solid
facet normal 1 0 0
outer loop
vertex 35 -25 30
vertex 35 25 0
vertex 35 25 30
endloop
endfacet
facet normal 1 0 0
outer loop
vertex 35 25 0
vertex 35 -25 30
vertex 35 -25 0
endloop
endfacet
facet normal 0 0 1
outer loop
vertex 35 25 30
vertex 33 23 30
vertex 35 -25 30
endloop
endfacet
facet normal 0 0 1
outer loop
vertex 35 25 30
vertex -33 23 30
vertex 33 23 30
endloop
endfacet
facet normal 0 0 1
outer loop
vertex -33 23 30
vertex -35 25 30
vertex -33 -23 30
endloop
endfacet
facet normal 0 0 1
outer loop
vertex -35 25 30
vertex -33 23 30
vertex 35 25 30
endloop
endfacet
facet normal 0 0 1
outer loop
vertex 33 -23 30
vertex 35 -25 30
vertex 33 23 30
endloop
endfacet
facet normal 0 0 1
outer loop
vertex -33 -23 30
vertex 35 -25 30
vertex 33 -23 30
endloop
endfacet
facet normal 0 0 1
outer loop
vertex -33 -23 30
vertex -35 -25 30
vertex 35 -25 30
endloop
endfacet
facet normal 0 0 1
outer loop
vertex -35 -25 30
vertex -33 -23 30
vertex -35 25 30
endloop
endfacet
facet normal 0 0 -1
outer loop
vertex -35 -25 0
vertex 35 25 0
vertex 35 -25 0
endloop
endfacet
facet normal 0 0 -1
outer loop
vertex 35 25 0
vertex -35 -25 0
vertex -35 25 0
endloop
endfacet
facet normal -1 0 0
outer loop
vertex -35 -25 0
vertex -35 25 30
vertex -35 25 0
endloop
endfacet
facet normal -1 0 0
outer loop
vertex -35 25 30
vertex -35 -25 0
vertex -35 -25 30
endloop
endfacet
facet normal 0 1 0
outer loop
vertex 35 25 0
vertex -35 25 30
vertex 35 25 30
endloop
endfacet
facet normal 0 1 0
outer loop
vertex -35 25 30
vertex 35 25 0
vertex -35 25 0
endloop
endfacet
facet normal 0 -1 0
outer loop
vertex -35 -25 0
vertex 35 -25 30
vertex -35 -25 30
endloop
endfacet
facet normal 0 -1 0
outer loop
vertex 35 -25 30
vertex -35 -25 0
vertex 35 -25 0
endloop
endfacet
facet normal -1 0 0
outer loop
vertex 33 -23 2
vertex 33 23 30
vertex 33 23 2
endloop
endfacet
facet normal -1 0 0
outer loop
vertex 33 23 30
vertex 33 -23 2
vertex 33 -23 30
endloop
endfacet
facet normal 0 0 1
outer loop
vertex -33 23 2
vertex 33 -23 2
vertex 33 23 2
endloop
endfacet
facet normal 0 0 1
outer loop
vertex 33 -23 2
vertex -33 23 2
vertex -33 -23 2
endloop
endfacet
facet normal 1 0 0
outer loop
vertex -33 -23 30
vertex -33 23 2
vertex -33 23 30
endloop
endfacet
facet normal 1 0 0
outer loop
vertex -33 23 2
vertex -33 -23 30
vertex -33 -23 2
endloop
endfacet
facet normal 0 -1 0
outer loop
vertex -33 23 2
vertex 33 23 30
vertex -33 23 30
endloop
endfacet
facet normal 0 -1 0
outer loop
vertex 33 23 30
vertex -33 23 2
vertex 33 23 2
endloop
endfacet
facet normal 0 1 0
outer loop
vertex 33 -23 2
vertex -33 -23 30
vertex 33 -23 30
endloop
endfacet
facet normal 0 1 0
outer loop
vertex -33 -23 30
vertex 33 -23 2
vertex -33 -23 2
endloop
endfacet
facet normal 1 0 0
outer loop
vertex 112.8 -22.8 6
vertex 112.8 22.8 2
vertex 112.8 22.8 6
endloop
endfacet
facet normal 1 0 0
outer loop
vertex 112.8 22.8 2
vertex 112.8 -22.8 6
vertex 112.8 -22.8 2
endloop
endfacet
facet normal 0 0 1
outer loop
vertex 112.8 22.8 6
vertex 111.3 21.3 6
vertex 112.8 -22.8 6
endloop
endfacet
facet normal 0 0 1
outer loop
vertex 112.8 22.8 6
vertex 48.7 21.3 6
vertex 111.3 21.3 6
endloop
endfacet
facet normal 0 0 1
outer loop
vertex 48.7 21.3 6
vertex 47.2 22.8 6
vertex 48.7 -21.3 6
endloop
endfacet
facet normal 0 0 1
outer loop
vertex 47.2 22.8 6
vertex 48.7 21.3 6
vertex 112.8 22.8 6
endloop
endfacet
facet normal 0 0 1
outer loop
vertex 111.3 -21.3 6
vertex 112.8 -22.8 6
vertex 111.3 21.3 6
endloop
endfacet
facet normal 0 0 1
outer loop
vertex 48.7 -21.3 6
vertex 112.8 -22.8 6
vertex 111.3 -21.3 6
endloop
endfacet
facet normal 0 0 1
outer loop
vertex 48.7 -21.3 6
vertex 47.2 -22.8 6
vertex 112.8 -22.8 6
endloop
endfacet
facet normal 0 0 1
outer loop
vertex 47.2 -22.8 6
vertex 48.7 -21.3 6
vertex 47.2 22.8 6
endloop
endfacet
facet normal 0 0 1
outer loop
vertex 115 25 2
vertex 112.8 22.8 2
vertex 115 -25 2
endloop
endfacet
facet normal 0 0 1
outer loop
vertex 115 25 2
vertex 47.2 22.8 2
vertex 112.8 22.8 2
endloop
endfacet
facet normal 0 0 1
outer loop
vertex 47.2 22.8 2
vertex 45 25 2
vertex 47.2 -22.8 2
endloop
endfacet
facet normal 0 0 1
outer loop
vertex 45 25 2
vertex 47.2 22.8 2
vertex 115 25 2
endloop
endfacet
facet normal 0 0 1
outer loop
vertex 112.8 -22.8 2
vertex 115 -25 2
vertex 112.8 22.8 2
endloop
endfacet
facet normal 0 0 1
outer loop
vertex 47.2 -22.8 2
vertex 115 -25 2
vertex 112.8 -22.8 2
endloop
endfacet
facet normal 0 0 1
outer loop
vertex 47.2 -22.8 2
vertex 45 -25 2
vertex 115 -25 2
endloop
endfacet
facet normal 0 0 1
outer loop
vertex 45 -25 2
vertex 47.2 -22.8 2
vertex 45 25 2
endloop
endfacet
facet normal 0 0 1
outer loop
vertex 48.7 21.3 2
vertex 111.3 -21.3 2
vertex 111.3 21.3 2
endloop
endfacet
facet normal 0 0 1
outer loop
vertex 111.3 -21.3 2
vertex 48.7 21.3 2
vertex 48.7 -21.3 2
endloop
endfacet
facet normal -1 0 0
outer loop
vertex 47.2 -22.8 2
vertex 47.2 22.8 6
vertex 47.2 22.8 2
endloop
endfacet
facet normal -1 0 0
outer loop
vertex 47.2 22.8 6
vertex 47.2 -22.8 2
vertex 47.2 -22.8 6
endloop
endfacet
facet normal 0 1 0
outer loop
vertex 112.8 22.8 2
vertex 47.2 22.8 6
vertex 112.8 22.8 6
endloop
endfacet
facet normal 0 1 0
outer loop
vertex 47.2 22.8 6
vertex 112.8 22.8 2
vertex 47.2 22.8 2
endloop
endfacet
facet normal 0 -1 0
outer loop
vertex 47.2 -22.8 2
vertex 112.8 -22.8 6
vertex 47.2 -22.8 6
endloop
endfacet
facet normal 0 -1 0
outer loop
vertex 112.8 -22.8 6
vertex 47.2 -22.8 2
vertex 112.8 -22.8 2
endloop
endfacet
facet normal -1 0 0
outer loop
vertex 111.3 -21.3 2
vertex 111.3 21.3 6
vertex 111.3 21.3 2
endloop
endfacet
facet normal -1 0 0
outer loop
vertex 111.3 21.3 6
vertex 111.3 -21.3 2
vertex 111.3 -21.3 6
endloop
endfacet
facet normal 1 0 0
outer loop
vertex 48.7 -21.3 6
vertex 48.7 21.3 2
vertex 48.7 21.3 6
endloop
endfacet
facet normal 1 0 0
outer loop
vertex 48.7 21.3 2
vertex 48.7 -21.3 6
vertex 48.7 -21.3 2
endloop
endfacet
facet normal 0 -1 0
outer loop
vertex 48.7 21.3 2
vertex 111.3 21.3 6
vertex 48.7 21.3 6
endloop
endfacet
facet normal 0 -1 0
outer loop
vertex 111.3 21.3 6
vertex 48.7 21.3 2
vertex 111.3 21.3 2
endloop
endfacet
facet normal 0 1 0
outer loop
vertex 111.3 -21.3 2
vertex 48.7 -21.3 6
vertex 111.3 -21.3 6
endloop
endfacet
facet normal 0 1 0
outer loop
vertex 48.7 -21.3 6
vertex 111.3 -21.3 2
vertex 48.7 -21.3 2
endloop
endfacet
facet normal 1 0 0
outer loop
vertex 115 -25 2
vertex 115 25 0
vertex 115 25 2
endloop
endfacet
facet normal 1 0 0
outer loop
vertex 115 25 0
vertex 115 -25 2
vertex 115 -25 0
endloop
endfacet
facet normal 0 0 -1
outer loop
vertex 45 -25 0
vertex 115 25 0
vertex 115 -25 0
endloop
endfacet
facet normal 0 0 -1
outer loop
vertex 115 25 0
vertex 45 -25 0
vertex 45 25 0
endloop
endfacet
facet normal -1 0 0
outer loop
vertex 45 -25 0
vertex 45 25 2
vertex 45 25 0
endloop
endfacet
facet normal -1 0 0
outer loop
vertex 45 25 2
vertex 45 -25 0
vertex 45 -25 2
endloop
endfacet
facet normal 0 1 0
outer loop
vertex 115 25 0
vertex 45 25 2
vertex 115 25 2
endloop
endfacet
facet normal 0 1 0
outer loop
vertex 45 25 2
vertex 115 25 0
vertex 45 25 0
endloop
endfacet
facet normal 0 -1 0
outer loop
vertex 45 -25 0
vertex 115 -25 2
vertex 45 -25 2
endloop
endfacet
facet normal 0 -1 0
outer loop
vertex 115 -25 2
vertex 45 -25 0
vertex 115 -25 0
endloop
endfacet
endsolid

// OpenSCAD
$fn = 64;

// ===== DIMENSIONS =====

// Box (Part 1)
box_outer_x = 70;    // Outer X dimension
box_outer_y = 50;    // Outer Y dimension
box_outer_z = 30;    // Outer Z dimension
wall_thick = 2;      // Wall thickness
floor_thick = 2;     // Floor thickness

// Lid (Part 2)
lid_base_x = 70;     // Base X dimension
lid_base_y = 50;     // Base Y dimension
lid_base_z = 2;      // Base thickness
rim_outer_x = 65.6;  // Rim outer X
rim_outer_y = 45.6;  // Rim outer Y
rim_thick = 1.5;     // Rim wall thickness
rim_height = 4;      // Rim height above base

// Spacing
gap = 10;            // Gap between parts on bed for printing

// ===== MODULES =====

// Box (Part 1) - centered on X and Y
module box() {
    difference() {
        // Solid outer box
        translate([-box_outer_x/2, -box_outer_y/2, 0])
        cube([box_outer_x, box_outer_y, box_outer_z]);
        
        // Inner cavity (open top) - extends 0.5mm beyond for clean cut
        translate([-box_outer_x/2 + wall_thick, 
                   -box_outer_y/2 + wall_thick, 
                   floor_thick])
        cube([box_outer_x - 2*wall_thick, 
              box_outer_y - 2*wall_thick, 
              box_outer_z - floor_thick + 0.5]);
    }
}

// Lid (Part 2) - positioned at +X side of box
module lid() {
    lid_x_pos = box_outer_x/2 + gap;
    
    // Base plate
    translate([lid_x_pos, -lid_base_y/2, 0])
    cube([lid_base_x, lid_base_y, lid_base_z]);
    
    // Rim with inner opening
    rim_inner_x = rim_outer_x - 2*rim_thick;
    rim_inner_y = rim_outer_y - 2*rim_thick;
    offset_x = (lid_base_x - rim_outer_x) / 2;
    offset_y = (lid_base_y - rim_outer_y) / 2;
    
    difference() {
        // Solid rim
        translate([lid_x_pos + offset_x, 
                   -lid_base_y/2 + offset_y, 
                   lid_base_z])
        cube([rim_outer_x, rim_outer_y, rim_height]);
        
        // Inner opening - extends 0.5mm below and 1mm above for clean cut
        translate([lid_x_pos + offset_x + rim_thick, 
                   -lid_base_y/2 + offset_y + rim_thick, 
                   lid_base_z - 0.5])
        cube([rim_inner_x, rim_inner_y, rim_height + 1]);
    }
}

// ===== RENDERING =====

box();
lid();
